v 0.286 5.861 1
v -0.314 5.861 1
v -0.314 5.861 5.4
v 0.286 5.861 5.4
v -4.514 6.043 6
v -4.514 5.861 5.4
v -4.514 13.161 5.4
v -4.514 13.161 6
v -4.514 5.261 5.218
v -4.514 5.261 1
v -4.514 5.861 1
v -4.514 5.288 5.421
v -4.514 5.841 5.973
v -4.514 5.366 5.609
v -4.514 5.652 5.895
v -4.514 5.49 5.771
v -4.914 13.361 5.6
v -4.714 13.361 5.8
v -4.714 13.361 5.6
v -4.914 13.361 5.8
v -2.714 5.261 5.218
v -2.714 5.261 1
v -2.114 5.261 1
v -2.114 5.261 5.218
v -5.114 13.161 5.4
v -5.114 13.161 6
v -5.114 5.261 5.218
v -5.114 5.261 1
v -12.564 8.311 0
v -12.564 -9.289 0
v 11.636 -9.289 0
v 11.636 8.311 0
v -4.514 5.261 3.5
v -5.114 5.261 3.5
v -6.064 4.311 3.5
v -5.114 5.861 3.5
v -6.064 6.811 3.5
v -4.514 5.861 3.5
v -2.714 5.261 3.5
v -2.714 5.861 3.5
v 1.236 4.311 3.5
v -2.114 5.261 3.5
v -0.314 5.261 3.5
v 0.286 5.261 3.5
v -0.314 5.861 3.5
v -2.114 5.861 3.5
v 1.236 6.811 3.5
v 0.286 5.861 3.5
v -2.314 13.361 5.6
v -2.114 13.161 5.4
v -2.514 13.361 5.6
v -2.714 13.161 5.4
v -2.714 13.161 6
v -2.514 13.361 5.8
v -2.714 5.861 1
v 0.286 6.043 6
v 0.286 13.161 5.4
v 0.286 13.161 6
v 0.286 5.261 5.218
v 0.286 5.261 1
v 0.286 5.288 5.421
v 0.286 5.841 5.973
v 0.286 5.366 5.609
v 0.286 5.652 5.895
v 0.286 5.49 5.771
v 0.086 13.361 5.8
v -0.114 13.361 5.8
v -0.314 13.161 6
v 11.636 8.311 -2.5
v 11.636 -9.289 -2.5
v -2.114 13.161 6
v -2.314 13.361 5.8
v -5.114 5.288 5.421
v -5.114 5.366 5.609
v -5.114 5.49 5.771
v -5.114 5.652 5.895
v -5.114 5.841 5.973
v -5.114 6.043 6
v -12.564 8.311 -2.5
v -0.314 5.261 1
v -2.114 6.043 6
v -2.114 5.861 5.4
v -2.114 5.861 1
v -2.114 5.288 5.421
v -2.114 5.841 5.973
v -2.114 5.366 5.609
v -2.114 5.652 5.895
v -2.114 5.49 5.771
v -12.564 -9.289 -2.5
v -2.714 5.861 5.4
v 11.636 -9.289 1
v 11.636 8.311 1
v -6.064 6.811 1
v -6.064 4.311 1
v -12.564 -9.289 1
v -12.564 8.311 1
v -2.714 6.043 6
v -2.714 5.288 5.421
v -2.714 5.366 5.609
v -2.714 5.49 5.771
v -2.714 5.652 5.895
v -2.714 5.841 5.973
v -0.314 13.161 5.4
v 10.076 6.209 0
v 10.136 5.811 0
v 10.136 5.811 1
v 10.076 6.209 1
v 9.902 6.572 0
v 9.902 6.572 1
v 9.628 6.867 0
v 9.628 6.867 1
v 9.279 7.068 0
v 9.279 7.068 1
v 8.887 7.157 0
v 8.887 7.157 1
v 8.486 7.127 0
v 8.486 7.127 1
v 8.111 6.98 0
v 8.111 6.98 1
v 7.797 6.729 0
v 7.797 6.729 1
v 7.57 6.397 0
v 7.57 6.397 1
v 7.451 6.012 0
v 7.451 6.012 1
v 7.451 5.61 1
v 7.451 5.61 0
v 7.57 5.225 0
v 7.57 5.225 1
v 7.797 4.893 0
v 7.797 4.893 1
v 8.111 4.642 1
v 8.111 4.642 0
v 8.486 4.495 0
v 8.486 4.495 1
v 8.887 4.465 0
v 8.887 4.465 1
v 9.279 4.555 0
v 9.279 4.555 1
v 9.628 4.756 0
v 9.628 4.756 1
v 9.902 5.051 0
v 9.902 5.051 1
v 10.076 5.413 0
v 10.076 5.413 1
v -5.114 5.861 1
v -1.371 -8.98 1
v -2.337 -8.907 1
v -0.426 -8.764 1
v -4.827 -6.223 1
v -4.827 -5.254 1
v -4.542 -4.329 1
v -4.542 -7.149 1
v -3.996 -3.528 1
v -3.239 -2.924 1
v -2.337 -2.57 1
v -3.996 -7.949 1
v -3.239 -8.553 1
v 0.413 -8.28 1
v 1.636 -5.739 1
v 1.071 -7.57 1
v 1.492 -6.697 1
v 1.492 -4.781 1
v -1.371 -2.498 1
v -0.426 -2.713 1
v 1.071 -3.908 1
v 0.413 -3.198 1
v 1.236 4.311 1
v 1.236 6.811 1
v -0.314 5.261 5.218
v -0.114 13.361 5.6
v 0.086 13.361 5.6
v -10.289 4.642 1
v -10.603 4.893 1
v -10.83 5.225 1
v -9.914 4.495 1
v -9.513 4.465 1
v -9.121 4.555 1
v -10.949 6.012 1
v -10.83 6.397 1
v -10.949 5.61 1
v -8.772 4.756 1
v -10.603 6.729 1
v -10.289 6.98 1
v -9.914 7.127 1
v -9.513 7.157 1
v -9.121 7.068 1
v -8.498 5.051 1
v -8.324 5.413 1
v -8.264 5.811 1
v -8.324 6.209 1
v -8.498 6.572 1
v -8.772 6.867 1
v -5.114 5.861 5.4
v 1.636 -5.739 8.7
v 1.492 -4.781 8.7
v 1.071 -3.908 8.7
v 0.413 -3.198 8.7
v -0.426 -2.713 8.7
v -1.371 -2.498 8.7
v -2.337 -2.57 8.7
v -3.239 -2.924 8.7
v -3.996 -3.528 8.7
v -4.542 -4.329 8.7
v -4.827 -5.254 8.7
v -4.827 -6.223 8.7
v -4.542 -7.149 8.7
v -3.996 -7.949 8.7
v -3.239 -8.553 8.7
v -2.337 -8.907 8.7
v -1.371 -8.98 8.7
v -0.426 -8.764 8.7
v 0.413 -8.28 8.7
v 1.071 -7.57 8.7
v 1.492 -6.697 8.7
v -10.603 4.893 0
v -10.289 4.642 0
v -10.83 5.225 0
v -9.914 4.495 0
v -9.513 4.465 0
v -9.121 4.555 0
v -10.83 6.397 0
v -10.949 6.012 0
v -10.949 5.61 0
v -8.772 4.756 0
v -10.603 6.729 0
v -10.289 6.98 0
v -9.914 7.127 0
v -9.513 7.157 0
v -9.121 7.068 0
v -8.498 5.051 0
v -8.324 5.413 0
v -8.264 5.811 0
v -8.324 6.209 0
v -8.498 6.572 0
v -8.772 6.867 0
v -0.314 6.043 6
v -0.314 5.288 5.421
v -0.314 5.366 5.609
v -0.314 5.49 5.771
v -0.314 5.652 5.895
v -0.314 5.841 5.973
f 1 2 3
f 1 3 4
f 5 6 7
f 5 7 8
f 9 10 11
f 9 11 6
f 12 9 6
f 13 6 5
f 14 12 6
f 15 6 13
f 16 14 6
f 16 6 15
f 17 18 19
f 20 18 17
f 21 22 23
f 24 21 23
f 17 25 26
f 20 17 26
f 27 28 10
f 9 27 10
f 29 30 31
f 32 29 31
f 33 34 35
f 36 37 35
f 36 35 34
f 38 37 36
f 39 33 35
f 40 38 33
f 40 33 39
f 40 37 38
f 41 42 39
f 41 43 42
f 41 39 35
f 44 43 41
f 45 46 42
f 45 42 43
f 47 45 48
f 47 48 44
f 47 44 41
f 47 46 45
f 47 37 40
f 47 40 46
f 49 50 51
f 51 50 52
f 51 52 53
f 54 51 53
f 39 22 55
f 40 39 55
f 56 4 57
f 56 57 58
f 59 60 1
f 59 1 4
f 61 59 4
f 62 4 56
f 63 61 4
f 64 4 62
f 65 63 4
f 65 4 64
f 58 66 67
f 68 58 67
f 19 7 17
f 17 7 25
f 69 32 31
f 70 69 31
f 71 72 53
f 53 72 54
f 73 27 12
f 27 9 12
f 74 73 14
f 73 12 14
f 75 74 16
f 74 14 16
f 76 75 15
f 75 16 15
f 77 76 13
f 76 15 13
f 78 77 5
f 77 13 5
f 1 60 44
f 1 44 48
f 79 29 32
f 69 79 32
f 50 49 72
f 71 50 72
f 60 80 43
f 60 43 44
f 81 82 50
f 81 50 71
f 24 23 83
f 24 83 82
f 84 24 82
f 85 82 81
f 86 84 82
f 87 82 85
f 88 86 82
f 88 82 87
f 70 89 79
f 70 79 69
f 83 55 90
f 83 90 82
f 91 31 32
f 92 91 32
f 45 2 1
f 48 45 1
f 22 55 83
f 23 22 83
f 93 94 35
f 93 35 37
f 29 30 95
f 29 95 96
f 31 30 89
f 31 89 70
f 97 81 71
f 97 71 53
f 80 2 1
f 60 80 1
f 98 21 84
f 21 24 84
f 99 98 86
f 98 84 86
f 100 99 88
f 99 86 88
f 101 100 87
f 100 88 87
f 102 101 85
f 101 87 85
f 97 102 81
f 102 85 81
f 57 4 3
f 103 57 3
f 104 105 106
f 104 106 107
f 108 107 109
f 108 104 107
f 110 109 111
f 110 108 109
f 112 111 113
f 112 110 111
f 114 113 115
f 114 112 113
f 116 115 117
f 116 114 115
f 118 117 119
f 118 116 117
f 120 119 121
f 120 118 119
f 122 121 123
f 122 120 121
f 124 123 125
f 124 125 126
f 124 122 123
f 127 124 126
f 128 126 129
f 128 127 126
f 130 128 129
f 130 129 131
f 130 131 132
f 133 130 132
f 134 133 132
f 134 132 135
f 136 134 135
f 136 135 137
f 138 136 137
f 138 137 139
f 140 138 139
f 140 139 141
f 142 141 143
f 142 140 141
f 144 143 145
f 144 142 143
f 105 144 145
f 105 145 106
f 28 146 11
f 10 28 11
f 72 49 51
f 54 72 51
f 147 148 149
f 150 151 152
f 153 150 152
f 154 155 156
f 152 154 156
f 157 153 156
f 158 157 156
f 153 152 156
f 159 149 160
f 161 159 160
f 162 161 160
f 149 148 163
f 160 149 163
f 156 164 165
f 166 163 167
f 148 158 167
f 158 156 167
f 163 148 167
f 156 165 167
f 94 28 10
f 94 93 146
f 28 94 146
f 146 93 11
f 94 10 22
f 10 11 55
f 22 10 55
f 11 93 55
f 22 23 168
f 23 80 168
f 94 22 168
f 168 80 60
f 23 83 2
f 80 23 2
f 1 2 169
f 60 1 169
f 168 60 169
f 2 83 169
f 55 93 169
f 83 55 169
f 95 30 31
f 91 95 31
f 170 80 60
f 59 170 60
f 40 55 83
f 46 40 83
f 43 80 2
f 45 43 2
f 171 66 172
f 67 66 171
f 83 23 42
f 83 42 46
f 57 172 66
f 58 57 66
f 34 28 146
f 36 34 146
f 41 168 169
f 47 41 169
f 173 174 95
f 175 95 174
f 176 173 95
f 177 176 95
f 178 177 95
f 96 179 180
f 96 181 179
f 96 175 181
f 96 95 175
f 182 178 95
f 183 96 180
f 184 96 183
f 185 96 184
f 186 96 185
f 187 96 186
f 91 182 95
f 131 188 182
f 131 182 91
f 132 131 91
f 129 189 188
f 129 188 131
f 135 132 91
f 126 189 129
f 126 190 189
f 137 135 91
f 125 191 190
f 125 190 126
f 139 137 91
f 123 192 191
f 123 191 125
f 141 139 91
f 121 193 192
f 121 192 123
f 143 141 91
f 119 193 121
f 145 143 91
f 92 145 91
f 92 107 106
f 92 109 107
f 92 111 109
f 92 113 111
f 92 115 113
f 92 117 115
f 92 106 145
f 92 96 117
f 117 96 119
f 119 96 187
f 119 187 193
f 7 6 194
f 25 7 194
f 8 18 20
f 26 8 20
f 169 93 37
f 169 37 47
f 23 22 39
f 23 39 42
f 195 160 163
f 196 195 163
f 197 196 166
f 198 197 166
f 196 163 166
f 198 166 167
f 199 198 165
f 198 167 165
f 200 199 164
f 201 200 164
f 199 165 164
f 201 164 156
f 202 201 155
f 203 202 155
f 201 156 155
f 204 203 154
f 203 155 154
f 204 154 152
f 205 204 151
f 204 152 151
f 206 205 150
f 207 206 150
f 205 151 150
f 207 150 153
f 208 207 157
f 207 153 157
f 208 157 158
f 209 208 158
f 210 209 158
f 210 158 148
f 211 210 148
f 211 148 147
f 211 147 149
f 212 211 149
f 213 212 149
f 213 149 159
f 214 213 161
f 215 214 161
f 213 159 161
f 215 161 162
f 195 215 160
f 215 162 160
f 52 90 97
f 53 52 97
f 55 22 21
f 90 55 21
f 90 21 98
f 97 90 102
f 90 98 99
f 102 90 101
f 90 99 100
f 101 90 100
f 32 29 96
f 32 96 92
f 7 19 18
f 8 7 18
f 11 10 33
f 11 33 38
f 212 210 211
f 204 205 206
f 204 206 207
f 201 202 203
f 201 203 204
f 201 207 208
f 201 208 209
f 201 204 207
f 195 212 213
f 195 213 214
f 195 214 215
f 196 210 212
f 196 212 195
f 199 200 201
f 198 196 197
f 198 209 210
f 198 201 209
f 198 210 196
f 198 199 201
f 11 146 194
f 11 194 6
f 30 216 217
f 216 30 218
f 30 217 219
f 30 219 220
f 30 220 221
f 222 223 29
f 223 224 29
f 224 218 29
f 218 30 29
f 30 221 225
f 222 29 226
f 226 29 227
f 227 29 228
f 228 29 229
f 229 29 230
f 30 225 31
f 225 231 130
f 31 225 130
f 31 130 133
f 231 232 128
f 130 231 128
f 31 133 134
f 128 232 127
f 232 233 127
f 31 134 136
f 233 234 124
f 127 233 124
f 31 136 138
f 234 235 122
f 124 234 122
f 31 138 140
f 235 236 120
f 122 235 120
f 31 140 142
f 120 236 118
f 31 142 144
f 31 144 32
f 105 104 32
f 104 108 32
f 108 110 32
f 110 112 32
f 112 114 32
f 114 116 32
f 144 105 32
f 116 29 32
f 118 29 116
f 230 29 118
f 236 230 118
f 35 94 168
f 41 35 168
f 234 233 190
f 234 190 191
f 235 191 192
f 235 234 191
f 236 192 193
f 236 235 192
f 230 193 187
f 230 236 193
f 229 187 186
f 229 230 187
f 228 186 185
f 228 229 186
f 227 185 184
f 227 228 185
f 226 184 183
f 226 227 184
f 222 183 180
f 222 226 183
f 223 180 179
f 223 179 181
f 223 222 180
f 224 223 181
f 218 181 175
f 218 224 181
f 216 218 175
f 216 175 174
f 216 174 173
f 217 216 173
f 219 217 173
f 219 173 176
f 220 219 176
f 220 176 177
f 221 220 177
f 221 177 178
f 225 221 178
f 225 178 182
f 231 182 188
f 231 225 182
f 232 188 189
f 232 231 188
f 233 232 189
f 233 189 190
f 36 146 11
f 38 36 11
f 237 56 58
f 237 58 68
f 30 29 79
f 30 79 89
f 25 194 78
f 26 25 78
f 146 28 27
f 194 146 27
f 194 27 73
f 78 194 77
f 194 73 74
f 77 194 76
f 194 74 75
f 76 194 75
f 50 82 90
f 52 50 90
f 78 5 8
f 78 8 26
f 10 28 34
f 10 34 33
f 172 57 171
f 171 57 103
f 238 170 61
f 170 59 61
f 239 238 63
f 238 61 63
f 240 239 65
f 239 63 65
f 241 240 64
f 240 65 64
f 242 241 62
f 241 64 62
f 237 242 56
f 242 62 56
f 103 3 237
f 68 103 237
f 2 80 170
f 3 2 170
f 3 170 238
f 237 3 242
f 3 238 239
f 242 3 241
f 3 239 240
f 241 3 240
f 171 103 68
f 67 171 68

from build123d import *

# Parameters (mm, degrees)
F0_W      = 24.2
F0_H      = 17.6
F0_R      = 1.35
F1_DEPTH  = 1
F2_W      = 7.3
F2_H      = 2.5
F2_W_2    = 0.6
F2_H_2    = 0.6
F3_DEPTH  = 2.5
F4_W      = 0.6
F4_H      = 0.6
F5_DEPTH  = 5
F6_W      = 0.6
F6_H      = 0.6
F7_DEPTH  = 7.5
F8_R      = 0.781625783
F8_2_R    = 0.781625783
F8_3_R    = 0.781625783
F9_SIZE   = 0.2
F9_2_SIZE = 0.2
F9_3_SIZE = 0.2
F10_R     = 3.25
F11_DEPTH = 7.7
F12_W     = 24.2
F12_H     = 17.6
F12_R     = 1.35
F13_DEPTH = 2.5


with BuildPart() as f1:
    # F0 (on Top) → F1 (new body)
    with BuildSketch(Plane.XY):
        with Locations((-0.4637802485, -0.4887992391)):
            Rectangle(F0_W, F0_H)
        with Locations((-9.6137802485, 5.8112007609)):
            Circle(F0_R, mode=Mode.SUBTRACT)
        with Locations((8.7862197515, 5.8112007609)):
            Circle(F0_R, mode=Mode.SUBTRACT)
    extrude(amount=F1_DEPTH)


with BuildPart() as f3:
    # F2 (on face) → F3 (new body)
    with BuildSketch(Plane.XY.offset(1)):
        with Locations((-2.4137802485, 5.5612007609)):
            Rectangle(F2_W, F2_H)
        with Locations((-4.8137802485, 5.5612007609)):
            Rectangle(F2_W_2, F2_H_2, mode=Mode.SUBTRACT)
        with Locations((-2.4137802485, 5.5612007609)):
            Rectangle(F2_W_2, F2_H_2, mode=Mode.SUBTRACT)
        with Locations((-0.0137802485, 5.5612007609)):
            Rectangle(F2_W_2, F2_H_2, mode=Mode.SUBTRACT)
    extrude(amount=F3_DEPTH)


with BuildPart() as f5:
    # F4 (on face) → F5 (new body)
    with BuildSketch(Plane.XY.offset(1)):
        with Locations((-4.8137802485, 5.5612007609)):
            Rectangle(F4_W, F4_H)
    extrude(amount=F5_DEPTH)

    # F6 (on face) → F7, piece 3 (join)
    with BuildSketch(Plane(origin=(0, 5.8612007609, 0), x_dir=(-1, 0, 0), z_dir=(0, 1, 0))):
        with Locations((4.8137802485, 5.7)):
            Rectangle(F6_W, F6_H)
    extrude(amount=F7_DEPTH)

    # F8
    f8_edges = [f5.edges().sort_by_distance(p)[0] for p in [
        (-4.81378, 5.261201, 6),
    ]]
    fillet(f8_edges, radius=F8_R)

    # F9
    f9_edges = [f5.edges().sort_by_distance(p)[0] for p in [
        (-4.81378, 13.361201, 6),
        (-4.51378, 13.361201, 5.7),
        (-4.81378, 13.361201, 5.4),
        (-5.11378, 13.361201, 5.7),
    ]]
    chamfer(f9_edges, length=F9_SIZE)


with BuildPart() as f5b:
    # F4 (on face) → F5, piece 2 (new body)
    with BuildSketch(Plane.XY.offset(1)):
        with Locations((-2.4137802485, 5.5612007609)):
            Rectangle(F4_W, F4_H)
    extrude(amount=F5_DEPTH)

    # F6 (on face) → F7, piece 2 (join)
    with BuildSketch(Plane(origin=(0, 5.8612007609, 0), x_dir=(-1, 0, 0), z_dir=(0, 1, 0))):
        with Locations((2.4137802485, 5.7)):
            Rectangle(F6_W, F6_H)
    extrude(amount=F7_DEPTH)

    # F8#2
    f8_2_edges = [f5b.edges().sort_by_distance(p)[0] for p in [
        (-2.41378, 5.261201, 6),
    ]]
    fillet(f8_2_edges, radius=F8_2_R)

    # F9#2
    f9_2_edges = [f5b.edges().sort_by_distance(p)[0] for p in [
        (-2.11378, 13.361201, 5.7),
        (-2.41378, 13.361201, 6),
        (-2.41378, 13.361201, 5.4),
        (-2.71378, 13.361201, 5.7),
    ]]
    chamfer(f9_2_edges, length=F9_2_SIZE)


with BuildPart() as f5c:
    # F4 (on face) → F5, piece 3 (new body)
    with BuildSketch(Plane.XY.offset(1)):
        with Locations((-0.0137802485, 5.5612007609)):
            Rectangle(F4_W, F4_H)
    extrude(amount=F5_DEPTH)

    # F6 (on face) → F7 (join)
    with BuildSketch(Plane(origin=(0, 5.8612007609, 0), x_dir=(-1, 0, 0), z_dir=(0, 1, 0))):
        with Locations((0.0137802485, 5.7)):
            Rectangle(F6_W, F6_H)
    extrude(amount=F7_DEPTH)

    # F8#3
    f8_3_edges = [f5c.edges().sort_by_distance(p)[0] for p in [
        (-0.01378, 5.261201, 6),
    ]]
    fillet(f8_3_edges, radius=F8_3_R)

    # F9#3
    f9_3_edges = [f5c.edges().sort_by_distance(p)[0] for p in [
        (-0.01378, 13.361201, 6),
        (-0.01378, 13.361201, 5.4),
        (0.28622, 13.361201, 5.7),
        (-0.31378, 13.361201, 5.7),
    ]]
    chamfer(f9_3_edges, length=F9_3_SIZE)


with BuildPart() as f11:
    # F10 (on face) → F11 (new body)
    with BuildSketch(Plane.XY.offset(1)):
        with Locations((-1.6137802485, -5.7387992391)):
            Circle(F10_R)
    extrude(amount=F11_DEPTH)


with BuildPart() as f13:
    # F12 (on face) → F13 (new body)
    with BuildSketch(Plane(origin=(0, 0, 0), x_dir=(1, 0, 0), z_dir=(0, 0, -1))):
        with Locations((-0.4637802485, 0.4887992391)):
            Rectangle(F12_W, F12_H)
        with Locations((-9.6137802485, -5.8112007609)):
            Circle(F12_R, mode=Mode.SUBTRACT)
        with Locations((8.7862197515, -5.8112007609)):
            Circle(F12_R, mode=Mode.SUBTRACT)
        with Locations((-9.6137802485, -5.8112007609)):
            Circle(F12_R)
        with Locations((8.7862197515, -5.8112007609)):
            Circle(F12_R)
    extrude(amount=F13_DEPTH)


solid = Compound([f1.part, f3.part, f5.part, f5b.part, f5c.part, f11.part, f13.part])
